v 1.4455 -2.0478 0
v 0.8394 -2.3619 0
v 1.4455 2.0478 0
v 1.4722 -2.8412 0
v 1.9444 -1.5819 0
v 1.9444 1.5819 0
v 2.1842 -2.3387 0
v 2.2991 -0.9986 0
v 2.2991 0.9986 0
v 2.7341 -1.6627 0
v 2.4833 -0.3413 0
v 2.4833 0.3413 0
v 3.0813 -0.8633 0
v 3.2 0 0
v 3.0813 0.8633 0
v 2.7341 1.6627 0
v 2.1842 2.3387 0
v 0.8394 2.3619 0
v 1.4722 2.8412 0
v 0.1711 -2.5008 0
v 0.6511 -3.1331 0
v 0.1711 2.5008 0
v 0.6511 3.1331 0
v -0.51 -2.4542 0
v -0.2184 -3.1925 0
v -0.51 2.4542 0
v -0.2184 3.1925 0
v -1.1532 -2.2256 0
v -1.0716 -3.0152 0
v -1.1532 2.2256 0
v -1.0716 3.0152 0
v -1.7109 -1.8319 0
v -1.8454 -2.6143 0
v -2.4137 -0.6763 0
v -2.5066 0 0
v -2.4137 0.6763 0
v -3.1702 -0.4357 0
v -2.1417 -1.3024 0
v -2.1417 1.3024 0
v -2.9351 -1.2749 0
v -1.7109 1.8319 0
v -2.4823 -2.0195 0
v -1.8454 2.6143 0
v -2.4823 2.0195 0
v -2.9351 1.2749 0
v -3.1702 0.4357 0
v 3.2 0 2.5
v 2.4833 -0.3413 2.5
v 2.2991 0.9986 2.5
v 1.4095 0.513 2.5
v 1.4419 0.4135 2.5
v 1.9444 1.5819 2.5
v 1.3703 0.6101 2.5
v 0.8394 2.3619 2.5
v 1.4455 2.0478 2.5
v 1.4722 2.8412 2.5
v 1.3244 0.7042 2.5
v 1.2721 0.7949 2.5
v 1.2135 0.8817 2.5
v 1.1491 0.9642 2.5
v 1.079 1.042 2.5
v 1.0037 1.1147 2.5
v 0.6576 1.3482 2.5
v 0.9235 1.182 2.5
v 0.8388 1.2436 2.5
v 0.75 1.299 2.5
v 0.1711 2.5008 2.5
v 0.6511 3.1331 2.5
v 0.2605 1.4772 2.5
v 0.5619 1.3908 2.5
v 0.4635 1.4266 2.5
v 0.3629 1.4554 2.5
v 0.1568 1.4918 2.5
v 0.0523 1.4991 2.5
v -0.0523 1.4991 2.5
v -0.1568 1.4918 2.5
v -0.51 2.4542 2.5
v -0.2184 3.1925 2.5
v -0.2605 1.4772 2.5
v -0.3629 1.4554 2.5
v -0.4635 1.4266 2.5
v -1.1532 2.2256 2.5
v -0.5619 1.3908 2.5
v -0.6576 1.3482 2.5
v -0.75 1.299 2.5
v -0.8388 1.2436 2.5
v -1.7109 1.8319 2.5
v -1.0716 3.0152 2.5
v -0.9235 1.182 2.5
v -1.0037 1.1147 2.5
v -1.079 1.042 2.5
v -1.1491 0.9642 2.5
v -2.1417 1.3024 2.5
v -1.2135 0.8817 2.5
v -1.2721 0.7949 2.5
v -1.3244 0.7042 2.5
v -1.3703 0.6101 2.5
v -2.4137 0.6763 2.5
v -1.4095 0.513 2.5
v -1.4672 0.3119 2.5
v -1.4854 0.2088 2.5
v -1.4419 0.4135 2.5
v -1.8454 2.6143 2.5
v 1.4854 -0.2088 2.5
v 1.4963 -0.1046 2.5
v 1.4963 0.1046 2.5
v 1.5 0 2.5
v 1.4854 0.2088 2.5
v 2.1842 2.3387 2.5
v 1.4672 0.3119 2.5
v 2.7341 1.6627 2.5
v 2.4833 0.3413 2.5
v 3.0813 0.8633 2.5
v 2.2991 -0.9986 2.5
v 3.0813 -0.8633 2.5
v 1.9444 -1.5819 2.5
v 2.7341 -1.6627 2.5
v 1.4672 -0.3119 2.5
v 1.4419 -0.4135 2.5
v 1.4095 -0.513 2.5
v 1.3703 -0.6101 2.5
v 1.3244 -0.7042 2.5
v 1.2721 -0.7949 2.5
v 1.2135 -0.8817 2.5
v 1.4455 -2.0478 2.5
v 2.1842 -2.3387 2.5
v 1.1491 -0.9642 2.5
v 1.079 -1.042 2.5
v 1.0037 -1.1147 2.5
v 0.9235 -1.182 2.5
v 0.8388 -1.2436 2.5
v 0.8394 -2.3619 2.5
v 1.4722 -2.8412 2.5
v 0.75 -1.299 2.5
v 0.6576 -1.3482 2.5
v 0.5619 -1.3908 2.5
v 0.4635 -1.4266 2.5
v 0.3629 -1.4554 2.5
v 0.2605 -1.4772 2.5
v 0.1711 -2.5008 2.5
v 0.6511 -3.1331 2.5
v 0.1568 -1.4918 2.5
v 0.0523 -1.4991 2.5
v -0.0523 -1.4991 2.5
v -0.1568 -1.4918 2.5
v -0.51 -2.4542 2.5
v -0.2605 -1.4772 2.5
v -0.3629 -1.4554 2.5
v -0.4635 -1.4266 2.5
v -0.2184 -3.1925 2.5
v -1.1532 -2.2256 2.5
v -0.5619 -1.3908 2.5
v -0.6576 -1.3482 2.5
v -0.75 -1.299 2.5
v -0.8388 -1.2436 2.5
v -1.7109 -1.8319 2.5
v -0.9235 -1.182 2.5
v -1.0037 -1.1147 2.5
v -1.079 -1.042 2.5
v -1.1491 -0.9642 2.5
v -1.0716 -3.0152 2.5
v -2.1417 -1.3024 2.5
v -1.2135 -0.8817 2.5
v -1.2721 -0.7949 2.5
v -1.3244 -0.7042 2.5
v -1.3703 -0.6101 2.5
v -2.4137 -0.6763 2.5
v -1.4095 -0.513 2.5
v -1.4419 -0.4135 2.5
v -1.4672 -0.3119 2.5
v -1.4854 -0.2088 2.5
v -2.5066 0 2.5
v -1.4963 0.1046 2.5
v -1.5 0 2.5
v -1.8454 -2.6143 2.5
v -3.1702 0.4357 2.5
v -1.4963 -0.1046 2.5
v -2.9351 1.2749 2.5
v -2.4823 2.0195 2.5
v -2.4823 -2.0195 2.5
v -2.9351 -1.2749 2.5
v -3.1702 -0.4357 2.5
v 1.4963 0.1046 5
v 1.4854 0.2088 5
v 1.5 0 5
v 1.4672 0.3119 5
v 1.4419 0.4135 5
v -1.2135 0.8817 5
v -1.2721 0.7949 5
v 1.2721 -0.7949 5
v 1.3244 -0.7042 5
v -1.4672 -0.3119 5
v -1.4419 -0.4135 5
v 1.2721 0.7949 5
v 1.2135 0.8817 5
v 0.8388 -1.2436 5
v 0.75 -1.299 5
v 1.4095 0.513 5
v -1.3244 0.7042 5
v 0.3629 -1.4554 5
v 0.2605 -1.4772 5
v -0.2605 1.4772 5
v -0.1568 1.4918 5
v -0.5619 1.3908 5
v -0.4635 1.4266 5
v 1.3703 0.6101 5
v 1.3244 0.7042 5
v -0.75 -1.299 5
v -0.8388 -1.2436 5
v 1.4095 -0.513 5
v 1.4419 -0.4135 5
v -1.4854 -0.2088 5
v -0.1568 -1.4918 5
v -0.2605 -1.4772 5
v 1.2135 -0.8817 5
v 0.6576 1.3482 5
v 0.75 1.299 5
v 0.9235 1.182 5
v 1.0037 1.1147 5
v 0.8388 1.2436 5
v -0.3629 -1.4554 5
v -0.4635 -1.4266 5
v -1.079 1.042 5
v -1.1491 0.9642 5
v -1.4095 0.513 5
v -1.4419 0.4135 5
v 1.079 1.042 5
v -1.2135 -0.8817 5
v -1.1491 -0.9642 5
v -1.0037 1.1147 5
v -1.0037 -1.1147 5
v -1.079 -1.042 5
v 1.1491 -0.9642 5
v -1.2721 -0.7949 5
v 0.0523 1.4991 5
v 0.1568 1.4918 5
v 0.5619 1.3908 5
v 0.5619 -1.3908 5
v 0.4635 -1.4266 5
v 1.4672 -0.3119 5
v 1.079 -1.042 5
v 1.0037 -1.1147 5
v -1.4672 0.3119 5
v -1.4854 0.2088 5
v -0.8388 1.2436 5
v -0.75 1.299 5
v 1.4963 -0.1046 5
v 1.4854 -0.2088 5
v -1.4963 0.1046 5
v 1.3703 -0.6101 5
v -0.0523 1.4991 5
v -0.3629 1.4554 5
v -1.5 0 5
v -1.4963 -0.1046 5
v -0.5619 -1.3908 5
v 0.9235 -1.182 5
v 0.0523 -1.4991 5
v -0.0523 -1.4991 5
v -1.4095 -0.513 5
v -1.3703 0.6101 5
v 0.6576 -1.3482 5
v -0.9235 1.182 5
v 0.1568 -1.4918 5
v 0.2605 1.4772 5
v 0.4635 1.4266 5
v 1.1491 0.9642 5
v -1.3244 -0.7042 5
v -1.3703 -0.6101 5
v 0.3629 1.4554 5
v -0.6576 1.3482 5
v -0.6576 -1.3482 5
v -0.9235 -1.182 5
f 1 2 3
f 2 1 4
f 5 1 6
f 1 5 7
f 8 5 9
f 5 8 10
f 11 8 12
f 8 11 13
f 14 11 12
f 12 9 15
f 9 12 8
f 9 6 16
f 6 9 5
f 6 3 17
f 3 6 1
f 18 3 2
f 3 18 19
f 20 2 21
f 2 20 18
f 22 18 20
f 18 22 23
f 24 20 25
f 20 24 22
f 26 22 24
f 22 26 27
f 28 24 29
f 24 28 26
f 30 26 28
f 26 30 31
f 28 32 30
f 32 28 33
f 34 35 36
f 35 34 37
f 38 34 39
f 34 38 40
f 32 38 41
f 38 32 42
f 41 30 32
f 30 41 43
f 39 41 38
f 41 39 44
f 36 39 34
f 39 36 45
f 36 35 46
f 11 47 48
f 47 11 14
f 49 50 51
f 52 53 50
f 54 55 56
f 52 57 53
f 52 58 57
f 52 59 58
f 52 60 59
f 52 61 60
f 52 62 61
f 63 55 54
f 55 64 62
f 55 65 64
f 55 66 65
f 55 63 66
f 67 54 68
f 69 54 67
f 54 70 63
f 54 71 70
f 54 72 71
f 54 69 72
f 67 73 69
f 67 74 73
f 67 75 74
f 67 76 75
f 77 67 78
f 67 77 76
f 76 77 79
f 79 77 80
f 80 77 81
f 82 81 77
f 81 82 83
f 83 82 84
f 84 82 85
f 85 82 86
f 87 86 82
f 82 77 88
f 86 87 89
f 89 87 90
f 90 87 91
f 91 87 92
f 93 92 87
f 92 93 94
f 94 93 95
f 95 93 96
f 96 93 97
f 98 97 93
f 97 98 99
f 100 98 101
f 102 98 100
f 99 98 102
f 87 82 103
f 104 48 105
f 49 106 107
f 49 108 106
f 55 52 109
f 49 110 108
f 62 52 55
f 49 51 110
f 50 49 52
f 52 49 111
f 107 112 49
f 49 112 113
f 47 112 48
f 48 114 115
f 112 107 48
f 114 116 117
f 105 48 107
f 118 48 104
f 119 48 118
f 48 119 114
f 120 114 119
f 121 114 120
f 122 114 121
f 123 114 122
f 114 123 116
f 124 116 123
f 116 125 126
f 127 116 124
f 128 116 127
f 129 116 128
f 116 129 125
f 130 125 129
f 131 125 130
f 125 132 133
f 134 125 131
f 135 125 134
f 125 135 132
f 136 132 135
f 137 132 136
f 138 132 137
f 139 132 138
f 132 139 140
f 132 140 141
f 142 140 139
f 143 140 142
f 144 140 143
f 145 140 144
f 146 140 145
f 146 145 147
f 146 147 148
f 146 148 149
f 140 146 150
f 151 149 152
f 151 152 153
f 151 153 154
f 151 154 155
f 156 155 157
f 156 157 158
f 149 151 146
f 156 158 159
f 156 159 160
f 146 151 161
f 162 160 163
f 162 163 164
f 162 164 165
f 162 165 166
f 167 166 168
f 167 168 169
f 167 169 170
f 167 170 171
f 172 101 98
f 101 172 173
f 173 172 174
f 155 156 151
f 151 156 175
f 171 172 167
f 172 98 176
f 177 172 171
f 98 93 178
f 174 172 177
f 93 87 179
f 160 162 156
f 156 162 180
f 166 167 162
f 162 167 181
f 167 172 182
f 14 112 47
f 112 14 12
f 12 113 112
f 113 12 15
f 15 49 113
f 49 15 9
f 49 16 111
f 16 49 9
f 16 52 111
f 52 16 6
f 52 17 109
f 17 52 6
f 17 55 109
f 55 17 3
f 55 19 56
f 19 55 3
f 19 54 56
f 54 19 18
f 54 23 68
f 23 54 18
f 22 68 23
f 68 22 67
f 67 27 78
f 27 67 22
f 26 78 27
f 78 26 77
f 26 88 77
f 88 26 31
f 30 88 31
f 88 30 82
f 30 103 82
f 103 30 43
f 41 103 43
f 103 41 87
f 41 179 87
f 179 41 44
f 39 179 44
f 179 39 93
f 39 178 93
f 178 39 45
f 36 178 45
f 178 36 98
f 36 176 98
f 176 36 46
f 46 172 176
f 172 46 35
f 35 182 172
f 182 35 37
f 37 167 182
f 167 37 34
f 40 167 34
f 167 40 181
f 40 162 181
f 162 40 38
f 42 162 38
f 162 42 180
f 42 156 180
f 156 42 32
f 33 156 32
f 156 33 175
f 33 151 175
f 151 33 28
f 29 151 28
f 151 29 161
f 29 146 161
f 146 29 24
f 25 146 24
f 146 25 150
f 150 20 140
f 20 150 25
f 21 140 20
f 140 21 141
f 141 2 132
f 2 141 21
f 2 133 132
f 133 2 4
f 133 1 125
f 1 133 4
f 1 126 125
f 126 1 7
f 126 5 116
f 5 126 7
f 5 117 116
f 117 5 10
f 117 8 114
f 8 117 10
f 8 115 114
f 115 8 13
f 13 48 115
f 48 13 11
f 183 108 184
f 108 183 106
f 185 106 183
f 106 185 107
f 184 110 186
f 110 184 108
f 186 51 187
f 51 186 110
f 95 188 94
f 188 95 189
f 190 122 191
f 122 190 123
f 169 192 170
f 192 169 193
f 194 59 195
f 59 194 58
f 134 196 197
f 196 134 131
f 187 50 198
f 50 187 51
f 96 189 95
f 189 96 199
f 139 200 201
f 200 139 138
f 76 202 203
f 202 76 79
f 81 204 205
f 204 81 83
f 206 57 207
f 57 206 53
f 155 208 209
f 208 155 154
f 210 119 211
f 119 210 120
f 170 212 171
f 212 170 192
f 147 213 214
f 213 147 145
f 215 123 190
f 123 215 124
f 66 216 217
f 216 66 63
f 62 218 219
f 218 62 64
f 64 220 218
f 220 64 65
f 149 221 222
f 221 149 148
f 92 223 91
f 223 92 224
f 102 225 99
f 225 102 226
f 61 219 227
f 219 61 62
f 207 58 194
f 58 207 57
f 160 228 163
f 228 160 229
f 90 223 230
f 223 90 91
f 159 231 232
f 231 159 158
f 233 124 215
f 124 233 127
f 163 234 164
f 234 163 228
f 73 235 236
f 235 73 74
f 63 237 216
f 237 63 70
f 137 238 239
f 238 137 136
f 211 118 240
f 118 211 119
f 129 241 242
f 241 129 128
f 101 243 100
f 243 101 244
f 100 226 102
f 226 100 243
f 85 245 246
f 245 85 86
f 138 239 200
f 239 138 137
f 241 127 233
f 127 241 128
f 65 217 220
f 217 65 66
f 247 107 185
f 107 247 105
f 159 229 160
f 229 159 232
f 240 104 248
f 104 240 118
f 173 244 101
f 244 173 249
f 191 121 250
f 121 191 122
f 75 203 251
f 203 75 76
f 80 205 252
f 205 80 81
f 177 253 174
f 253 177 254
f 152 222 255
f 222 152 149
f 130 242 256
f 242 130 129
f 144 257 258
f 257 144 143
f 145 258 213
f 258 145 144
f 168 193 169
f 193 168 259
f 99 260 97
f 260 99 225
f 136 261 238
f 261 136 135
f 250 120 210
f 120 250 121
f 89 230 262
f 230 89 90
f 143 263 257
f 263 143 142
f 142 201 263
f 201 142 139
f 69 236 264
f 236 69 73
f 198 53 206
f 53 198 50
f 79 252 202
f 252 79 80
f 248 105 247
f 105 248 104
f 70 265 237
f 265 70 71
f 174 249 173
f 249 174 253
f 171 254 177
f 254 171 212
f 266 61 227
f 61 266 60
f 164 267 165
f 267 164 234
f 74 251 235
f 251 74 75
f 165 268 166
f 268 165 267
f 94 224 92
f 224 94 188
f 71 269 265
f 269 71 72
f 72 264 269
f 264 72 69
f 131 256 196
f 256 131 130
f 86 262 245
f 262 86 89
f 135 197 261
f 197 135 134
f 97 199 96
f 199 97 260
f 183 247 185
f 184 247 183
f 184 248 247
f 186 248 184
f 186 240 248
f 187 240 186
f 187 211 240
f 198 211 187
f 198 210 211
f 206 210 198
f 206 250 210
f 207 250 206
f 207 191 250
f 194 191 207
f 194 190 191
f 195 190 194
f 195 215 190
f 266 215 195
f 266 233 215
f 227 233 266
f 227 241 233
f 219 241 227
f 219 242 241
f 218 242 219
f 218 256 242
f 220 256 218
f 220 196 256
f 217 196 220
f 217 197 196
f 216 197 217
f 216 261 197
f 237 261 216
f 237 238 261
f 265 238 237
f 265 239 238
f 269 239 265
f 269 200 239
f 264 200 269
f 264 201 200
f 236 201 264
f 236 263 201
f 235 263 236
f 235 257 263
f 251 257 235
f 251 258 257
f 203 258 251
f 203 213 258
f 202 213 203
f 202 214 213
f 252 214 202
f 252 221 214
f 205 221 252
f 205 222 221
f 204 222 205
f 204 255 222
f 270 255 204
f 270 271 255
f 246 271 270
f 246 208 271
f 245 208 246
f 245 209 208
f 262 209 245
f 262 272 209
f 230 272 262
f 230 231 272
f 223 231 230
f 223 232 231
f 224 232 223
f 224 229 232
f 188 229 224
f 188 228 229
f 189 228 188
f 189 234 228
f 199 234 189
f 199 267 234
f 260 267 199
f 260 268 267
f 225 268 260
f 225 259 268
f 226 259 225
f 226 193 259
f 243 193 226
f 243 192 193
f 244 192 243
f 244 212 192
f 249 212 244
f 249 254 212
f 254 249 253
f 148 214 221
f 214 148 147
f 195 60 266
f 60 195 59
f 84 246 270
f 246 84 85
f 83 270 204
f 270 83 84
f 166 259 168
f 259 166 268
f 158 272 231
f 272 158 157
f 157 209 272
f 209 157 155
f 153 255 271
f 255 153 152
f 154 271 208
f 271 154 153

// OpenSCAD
#servoAxisFit();

module servoAxisFit(){
	toothAngle = 360/23;
	
	cylinder(d=3, h=5, $fn=90);
	
	for(angle = [0:toothAngle:360])
		rotate([0, 0, angle])
			linear_extrude(2.5)
				tooth();
	
	module tooth(){
		triangle();
		rotate([180, 0, 0])
			triangle();
	}

	module triangle(){
		angleOverlap = 0.1;
		angle = toothAngle/2 + angleOverlap;
		innerRadius = 2.5;
		height = innerRadius * sin(angle);
		a = innerRadius * cos(angle);
		polygon([[0,0], [3.2,0], [a,height]]);
	}
}
